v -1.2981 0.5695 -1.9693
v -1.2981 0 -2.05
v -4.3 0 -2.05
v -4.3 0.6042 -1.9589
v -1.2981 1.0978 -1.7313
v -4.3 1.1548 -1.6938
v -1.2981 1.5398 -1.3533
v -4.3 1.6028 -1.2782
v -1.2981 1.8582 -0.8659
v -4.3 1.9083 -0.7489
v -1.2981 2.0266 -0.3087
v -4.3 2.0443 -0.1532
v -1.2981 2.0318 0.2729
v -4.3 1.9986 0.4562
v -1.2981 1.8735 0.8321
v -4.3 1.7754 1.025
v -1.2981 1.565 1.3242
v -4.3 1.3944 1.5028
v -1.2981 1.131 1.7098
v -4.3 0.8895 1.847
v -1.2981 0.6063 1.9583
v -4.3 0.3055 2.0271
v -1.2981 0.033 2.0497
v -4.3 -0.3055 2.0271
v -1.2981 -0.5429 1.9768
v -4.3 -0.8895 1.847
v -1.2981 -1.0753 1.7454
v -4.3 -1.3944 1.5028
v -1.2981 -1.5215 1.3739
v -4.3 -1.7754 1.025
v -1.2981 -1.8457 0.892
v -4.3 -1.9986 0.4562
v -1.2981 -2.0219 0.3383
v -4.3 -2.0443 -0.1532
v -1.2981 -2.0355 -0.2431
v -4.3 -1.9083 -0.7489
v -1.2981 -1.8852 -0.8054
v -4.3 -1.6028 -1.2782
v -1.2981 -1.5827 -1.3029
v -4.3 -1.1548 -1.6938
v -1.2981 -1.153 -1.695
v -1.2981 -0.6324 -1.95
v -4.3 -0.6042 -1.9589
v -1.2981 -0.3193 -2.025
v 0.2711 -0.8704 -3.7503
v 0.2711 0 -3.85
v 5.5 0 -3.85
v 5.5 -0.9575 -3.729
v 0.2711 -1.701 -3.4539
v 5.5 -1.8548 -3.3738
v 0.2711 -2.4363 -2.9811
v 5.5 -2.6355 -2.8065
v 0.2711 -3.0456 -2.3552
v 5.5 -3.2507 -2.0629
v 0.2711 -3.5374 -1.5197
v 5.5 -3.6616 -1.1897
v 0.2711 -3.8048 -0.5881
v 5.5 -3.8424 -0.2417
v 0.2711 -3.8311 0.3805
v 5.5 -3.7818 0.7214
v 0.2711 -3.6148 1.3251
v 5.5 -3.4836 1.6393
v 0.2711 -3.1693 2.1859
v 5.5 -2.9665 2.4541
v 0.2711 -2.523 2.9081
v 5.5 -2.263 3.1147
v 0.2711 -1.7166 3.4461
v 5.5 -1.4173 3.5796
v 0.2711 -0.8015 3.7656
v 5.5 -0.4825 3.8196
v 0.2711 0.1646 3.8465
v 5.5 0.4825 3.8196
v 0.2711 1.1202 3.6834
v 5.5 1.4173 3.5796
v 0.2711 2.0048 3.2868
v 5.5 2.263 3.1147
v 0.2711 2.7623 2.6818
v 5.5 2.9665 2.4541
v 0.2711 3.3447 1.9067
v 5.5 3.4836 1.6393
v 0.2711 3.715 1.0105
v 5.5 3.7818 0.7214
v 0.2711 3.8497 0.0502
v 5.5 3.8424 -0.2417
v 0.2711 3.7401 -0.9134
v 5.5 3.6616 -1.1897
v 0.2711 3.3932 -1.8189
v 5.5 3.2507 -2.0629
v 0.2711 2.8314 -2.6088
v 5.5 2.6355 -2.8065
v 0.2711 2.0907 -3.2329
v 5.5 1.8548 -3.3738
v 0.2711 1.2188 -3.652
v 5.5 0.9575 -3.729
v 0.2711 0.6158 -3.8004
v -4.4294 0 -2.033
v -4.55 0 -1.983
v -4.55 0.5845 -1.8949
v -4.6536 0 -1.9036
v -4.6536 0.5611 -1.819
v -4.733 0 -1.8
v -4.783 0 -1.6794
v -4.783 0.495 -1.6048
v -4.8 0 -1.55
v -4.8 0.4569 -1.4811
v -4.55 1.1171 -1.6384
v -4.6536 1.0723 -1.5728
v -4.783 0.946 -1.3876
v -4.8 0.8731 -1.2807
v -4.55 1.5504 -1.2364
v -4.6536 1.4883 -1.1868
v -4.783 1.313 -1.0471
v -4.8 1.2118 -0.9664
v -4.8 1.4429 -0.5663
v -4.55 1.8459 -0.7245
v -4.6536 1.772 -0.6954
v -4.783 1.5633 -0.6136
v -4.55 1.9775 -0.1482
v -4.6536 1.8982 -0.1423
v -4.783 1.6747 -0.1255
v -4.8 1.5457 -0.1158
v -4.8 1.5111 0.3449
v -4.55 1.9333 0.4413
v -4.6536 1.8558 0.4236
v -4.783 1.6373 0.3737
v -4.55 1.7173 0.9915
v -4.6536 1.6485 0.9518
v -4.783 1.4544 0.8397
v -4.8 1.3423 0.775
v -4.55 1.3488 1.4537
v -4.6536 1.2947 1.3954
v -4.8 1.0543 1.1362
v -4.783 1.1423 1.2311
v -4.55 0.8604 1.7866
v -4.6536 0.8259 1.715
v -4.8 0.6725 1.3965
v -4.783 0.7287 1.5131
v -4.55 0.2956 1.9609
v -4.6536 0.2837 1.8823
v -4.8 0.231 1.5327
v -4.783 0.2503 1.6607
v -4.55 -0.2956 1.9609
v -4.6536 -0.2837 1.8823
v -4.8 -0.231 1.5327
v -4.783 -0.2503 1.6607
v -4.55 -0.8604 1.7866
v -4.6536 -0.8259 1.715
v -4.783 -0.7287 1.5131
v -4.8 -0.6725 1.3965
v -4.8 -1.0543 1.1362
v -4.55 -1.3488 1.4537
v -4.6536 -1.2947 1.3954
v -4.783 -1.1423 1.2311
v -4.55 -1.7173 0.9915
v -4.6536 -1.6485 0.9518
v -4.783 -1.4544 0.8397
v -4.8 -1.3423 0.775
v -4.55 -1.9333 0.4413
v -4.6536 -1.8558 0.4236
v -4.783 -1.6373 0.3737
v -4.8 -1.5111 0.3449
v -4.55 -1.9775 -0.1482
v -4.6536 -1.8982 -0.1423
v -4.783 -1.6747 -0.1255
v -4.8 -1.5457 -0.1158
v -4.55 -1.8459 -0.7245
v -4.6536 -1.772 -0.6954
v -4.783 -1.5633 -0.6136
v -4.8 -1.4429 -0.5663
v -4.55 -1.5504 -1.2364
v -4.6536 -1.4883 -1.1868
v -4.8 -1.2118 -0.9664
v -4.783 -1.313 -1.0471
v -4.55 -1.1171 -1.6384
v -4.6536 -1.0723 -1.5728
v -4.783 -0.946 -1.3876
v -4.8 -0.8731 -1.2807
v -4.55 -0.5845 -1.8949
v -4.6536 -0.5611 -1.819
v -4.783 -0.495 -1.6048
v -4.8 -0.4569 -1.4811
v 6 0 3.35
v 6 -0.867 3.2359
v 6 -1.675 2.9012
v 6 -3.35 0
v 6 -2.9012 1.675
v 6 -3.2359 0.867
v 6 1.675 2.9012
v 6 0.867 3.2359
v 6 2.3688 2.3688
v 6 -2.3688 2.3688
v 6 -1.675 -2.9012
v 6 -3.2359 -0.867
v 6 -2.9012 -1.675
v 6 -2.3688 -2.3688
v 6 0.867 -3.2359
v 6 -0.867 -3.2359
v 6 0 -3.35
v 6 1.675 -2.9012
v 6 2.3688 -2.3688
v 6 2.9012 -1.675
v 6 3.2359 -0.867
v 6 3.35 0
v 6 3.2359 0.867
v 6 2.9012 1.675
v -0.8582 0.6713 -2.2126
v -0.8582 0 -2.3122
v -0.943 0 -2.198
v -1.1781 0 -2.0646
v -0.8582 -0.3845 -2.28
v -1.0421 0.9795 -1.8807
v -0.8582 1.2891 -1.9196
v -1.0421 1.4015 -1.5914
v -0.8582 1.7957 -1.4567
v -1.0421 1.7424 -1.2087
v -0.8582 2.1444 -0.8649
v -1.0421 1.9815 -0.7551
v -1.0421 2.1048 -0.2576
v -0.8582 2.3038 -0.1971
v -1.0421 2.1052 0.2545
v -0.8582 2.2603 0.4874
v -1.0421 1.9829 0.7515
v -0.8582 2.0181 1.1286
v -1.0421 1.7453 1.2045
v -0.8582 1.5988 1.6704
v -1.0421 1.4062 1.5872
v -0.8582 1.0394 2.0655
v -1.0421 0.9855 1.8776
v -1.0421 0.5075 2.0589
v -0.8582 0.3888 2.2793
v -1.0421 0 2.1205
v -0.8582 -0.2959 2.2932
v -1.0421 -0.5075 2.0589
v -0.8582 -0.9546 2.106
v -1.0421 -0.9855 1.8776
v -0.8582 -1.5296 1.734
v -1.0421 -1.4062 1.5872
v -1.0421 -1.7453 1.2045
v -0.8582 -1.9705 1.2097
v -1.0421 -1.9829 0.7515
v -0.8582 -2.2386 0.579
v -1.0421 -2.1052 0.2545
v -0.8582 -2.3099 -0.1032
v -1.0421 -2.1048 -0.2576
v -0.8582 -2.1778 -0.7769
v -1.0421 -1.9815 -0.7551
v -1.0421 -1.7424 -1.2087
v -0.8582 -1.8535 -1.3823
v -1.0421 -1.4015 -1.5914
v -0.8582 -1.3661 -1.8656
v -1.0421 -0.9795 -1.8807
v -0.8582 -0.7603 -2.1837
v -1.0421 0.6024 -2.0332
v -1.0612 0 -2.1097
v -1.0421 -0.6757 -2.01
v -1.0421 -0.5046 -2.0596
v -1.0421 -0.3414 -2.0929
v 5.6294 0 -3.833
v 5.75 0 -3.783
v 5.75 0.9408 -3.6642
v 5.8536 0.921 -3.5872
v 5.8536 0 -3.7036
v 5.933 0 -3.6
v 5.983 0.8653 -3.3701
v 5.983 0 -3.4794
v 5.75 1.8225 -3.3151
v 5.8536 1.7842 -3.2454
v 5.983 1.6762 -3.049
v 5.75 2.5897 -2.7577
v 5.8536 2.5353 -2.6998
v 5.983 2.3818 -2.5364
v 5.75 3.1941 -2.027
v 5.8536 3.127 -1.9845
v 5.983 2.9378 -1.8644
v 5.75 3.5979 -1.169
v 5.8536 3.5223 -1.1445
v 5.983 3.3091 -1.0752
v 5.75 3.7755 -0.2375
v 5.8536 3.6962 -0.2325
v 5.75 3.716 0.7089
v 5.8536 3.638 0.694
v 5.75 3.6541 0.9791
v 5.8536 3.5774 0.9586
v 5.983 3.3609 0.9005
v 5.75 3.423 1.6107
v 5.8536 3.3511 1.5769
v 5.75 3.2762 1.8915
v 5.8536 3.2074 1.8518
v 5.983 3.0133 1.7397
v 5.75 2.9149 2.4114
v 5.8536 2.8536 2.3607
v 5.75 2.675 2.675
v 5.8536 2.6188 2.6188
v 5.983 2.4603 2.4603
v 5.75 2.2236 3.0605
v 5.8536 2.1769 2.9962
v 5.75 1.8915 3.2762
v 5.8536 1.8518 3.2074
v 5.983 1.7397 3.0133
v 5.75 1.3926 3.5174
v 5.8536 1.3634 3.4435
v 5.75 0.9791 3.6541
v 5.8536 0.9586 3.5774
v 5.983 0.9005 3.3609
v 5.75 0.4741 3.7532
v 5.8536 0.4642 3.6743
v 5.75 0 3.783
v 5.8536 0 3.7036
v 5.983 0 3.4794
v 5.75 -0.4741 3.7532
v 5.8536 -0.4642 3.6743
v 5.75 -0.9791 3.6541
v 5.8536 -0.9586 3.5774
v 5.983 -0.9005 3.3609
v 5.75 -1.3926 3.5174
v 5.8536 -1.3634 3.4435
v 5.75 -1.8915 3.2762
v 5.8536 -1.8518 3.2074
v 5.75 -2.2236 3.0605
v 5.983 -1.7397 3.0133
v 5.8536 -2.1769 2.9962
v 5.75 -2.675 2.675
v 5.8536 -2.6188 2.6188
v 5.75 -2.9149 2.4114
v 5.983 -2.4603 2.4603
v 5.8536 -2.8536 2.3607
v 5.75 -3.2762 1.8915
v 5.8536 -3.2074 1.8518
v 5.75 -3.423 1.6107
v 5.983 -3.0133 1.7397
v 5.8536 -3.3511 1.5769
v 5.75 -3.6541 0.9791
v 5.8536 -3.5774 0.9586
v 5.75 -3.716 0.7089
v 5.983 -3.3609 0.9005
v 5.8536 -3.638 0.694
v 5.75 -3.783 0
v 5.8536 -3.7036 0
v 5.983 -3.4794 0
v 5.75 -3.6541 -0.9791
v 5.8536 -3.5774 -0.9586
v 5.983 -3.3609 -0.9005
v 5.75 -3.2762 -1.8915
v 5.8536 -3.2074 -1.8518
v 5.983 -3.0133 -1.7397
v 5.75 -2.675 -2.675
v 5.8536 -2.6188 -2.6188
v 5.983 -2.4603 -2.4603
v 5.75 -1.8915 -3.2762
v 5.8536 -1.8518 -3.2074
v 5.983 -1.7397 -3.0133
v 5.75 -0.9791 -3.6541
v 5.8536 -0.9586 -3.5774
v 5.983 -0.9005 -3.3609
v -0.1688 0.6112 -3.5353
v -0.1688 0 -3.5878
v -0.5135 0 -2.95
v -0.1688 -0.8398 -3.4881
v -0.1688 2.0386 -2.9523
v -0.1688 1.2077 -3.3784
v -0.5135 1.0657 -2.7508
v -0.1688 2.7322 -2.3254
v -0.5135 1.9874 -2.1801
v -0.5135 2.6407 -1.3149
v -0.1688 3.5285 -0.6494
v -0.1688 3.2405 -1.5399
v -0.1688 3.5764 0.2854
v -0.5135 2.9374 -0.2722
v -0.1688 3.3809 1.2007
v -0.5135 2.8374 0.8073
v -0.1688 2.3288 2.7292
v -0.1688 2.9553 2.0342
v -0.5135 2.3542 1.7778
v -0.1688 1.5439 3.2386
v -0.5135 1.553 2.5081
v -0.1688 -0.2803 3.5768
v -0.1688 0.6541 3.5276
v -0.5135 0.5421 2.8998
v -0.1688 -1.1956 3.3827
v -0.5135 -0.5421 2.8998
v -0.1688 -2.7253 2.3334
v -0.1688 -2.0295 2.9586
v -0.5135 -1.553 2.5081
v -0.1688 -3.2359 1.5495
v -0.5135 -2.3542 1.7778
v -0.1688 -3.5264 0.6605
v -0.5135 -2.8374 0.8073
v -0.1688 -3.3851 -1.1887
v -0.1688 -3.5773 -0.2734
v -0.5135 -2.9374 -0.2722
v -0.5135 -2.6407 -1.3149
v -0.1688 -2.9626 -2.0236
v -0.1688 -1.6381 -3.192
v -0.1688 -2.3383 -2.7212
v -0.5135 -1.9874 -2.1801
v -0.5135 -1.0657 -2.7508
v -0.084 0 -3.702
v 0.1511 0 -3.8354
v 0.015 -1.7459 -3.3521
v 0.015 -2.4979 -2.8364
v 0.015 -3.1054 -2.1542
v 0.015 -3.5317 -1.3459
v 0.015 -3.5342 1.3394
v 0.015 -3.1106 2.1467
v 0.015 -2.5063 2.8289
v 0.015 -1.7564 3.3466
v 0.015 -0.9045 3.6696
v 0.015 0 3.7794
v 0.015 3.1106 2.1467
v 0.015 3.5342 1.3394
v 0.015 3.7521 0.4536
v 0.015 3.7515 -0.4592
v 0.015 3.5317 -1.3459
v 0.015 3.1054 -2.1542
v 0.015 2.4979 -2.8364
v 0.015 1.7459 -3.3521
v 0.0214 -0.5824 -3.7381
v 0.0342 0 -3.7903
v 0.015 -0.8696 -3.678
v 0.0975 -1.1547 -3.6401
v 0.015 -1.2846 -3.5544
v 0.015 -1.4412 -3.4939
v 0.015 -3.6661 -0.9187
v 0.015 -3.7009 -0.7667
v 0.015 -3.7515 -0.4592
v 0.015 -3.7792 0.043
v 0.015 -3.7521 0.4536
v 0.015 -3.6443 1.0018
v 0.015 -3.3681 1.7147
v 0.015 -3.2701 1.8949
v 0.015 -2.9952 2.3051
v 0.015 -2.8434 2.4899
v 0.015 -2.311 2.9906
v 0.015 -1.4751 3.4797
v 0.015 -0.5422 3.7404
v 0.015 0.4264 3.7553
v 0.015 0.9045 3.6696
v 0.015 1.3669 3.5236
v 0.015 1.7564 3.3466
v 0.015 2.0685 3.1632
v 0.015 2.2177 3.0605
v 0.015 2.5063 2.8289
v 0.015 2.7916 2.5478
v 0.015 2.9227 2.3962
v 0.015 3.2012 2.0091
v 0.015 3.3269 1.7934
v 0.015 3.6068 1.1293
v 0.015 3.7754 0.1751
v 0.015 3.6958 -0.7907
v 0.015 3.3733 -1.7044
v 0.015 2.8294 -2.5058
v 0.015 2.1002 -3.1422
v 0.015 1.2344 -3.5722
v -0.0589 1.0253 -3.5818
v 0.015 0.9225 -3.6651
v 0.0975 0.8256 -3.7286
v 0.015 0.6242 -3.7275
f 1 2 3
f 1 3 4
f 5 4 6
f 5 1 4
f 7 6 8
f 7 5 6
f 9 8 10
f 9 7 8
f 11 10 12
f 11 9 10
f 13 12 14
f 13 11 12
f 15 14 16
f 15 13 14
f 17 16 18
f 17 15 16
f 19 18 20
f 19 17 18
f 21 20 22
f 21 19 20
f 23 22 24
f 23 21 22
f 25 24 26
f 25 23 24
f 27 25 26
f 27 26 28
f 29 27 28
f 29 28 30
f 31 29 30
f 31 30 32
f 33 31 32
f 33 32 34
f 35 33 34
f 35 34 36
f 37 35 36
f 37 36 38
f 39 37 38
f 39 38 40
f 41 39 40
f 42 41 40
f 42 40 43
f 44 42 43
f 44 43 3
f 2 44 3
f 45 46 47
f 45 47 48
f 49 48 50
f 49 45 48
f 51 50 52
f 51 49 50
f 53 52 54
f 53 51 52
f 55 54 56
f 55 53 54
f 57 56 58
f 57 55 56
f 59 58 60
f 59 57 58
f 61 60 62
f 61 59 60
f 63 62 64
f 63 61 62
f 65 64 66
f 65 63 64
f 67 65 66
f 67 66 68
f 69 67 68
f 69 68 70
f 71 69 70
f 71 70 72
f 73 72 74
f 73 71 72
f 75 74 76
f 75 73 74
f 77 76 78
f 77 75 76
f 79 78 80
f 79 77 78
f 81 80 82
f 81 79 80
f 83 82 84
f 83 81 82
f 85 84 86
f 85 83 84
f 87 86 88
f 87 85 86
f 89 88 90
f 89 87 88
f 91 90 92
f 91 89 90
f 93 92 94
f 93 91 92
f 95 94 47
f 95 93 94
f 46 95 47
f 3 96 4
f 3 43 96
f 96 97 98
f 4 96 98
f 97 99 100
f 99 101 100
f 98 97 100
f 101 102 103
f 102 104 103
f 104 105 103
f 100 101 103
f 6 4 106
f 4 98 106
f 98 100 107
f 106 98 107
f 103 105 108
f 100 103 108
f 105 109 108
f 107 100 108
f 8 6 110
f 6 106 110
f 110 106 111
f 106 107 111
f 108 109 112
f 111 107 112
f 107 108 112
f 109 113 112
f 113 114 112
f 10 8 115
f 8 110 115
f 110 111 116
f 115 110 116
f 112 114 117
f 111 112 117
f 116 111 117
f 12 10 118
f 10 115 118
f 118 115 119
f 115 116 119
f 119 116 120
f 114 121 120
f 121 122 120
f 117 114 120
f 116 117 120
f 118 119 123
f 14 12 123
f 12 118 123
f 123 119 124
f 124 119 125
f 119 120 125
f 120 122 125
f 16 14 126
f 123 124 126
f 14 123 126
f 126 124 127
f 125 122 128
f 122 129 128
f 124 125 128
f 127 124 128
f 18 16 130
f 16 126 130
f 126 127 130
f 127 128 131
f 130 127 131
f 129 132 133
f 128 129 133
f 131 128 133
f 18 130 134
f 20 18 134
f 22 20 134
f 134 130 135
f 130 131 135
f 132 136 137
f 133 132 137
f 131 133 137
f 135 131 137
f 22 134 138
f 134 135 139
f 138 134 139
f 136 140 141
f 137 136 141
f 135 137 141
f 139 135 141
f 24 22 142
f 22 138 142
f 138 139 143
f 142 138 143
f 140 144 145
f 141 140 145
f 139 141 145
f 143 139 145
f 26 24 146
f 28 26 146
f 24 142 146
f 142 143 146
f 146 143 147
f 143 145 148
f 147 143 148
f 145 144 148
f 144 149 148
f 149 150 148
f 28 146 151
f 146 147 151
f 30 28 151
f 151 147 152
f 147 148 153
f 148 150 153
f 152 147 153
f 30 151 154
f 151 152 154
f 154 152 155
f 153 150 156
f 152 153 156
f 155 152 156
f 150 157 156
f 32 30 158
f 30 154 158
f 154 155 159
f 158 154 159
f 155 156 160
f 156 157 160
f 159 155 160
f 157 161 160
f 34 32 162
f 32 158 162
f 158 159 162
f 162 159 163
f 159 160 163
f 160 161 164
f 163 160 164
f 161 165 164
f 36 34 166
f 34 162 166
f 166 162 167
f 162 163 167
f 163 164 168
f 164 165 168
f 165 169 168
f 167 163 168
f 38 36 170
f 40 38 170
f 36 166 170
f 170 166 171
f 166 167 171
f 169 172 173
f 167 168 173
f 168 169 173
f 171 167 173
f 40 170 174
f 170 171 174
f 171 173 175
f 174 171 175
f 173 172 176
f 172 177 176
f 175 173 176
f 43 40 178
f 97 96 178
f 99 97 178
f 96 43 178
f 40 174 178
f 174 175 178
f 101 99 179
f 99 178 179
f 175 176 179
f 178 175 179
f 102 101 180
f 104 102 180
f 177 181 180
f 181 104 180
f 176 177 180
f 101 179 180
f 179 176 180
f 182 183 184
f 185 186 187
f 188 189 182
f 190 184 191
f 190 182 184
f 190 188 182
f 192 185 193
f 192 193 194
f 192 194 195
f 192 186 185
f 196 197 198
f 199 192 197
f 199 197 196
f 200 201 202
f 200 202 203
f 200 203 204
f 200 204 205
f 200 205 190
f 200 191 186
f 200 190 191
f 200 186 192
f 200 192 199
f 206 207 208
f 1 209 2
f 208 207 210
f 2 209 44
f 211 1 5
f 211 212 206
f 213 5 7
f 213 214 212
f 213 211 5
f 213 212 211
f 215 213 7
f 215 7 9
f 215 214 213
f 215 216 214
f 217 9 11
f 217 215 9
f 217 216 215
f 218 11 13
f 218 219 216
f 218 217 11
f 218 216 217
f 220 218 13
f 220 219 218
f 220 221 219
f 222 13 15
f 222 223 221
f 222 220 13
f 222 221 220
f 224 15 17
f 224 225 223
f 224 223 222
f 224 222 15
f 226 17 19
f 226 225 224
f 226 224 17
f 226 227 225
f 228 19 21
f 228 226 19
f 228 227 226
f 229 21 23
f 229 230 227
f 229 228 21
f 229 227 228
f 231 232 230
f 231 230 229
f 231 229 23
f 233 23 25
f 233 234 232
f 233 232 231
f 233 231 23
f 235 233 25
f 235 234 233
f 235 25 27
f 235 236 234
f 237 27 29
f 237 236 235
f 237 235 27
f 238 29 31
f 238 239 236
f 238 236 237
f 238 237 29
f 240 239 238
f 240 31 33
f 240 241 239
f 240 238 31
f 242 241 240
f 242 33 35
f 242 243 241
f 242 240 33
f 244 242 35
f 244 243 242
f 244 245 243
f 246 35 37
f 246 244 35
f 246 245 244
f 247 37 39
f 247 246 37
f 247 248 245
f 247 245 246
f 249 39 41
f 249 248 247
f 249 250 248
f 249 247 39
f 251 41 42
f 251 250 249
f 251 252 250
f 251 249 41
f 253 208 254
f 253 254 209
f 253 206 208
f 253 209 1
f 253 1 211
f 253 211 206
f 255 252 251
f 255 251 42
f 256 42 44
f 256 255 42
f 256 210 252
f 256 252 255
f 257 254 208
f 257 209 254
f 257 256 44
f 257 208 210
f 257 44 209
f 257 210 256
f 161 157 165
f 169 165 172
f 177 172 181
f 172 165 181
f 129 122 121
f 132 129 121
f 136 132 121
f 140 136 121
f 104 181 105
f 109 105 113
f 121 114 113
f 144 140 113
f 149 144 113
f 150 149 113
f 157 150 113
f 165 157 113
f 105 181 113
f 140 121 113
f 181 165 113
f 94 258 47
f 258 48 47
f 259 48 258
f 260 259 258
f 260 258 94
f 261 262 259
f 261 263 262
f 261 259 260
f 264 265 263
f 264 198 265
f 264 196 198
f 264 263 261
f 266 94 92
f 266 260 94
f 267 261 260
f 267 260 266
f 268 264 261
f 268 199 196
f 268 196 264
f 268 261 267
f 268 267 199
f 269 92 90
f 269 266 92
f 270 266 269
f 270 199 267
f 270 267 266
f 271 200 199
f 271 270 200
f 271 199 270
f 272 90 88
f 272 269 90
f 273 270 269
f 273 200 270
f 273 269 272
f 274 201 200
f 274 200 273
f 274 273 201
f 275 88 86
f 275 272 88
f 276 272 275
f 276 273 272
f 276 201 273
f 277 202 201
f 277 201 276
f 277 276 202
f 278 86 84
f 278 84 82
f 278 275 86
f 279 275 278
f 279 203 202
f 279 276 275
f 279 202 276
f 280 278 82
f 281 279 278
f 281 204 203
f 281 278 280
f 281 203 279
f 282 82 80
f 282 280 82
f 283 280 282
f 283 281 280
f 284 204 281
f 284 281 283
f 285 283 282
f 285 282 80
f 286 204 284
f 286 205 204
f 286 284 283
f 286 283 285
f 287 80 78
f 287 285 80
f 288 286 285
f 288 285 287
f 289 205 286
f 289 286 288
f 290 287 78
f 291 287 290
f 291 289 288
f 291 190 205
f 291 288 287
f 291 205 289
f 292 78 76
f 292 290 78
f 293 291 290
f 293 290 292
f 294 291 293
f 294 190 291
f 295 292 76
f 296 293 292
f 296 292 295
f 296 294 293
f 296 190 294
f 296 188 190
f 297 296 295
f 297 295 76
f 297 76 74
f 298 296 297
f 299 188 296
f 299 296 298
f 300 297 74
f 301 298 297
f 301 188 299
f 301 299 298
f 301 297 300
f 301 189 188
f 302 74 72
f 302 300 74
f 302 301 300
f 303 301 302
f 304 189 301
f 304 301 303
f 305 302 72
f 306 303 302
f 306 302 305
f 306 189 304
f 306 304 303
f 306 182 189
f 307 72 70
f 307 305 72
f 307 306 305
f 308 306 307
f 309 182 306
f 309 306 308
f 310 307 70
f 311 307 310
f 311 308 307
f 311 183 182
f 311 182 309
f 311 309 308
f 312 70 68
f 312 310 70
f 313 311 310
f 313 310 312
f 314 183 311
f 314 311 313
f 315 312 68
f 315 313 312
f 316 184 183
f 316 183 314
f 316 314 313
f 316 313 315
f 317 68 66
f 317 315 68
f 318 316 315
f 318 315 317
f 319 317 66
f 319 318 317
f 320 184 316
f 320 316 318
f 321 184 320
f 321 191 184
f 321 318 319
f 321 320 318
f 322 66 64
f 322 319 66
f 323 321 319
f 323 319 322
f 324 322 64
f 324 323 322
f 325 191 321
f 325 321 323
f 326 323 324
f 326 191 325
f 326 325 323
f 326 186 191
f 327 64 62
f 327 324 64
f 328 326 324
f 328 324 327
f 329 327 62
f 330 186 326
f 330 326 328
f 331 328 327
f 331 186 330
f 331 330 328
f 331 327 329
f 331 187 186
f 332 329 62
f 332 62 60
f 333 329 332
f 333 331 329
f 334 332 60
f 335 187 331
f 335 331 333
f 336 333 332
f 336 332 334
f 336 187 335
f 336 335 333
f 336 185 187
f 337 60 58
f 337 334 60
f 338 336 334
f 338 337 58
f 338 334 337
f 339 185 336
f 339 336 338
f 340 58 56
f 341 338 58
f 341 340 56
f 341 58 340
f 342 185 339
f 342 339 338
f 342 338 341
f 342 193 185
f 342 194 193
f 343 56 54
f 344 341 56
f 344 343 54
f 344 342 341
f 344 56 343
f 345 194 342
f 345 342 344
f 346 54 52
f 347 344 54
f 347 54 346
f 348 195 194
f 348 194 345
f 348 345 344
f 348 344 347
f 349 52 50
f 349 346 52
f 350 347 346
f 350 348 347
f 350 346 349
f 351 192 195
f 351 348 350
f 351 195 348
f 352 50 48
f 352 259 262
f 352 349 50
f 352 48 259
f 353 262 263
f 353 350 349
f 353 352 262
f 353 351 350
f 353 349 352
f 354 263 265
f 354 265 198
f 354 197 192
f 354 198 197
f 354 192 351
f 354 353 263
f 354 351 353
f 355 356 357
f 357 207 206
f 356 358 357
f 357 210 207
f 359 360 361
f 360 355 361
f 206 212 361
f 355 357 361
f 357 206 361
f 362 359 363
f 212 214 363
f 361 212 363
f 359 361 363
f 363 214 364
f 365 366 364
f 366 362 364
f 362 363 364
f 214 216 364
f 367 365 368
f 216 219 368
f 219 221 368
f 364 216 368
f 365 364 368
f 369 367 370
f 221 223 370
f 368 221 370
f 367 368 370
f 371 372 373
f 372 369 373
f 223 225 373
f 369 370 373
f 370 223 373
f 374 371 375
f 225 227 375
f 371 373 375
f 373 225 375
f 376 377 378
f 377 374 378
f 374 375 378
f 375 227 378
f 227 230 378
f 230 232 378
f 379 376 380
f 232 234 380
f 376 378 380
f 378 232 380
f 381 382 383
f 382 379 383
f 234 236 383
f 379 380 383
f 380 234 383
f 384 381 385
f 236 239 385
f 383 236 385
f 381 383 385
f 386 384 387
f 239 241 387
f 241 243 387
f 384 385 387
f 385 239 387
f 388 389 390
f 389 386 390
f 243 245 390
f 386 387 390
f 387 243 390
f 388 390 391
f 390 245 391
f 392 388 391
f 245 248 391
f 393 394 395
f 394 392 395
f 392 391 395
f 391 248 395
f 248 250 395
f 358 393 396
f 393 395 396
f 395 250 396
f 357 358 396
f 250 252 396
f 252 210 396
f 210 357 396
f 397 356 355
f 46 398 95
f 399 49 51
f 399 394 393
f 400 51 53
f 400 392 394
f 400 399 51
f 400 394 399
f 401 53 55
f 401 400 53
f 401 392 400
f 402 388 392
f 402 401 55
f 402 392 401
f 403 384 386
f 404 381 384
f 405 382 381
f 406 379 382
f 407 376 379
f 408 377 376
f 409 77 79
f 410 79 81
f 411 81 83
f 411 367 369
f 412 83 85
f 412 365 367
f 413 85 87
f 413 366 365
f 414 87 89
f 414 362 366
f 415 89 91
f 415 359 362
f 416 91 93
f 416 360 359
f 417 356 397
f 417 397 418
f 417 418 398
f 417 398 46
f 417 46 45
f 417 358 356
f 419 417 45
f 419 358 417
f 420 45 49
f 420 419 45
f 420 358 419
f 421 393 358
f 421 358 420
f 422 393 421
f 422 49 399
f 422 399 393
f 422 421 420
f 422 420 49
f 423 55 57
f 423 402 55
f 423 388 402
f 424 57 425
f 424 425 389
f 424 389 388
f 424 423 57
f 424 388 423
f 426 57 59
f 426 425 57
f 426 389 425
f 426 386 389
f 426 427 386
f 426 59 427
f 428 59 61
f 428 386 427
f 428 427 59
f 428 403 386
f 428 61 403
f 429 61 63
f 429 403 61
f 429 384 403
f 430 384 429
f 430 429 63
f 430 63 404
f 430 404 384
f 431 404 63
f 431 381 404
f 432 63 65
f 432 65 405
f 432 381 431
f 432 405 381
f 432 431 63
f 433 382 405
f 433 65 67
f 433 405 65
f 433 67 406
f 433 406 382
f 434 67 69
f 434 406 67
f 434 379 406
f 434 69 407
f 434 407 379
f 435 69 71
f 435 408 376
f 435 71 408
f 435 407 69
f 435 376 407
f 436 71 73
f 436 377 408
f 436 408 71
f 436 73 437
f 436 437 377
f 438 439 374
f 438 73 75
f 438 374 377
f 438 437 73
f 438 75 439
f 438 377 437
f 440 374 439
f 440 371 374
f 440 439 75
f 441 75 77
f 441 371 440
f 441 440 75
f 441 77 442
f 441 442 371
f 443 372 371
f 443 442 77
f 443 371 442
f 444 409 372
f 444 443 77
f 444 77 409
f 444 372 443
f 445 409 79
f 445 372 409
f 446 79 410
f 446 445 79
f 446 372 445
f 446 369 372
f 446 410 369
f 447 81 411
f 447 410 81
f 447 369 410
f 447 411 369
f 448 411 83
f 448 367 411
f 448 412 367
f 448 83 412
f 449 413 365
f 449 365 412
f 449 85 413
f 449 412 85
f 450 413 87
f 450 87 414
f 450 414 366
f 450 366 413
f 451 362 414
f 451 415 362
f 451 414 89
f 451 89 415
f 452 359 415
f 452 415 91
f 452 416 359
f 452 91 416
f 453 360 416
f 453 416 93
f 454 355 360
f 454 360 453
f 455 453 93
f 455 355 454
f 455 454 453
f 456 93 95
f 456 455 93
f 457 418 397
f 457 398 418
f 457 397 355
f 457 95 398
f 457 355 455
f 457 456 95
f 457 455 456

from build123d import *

# Parameters (mm, degrees)
CROQUIS1_R              = 3.85
CROQUIS1_R_2            = 2.05
SALIENTE_EXTRUIR1_DEPTH = 6
CROQUIS1_3_R            = 2.05
SALIENTE_EXTRUIR2_DEPTH = 4.8
CHAFL_N1_SIZE           = 1.85
CHAFL_N1_SIZE_2         = 1
REDONDEO1_R             = 0.5


with BuildPart() as part:
    # Croquis1 → Saliente-Extruir1 (new body)
    # profile 1 of 2: a face of its own
    with BuildSketch(Plane.YZ):
        with Locations(Location((0, 0, 0), (0, 0, 270))):
            Circle(CROQUIS1_R)
        Circle(CROQUIS1_R_2, mode=Mode.SUBTRACT)
    # profile 2 of 2: a face of its own
    with BuildSketch(Plane.YZ):
        Circle(CROQUIS1_R_2)
    extrude(amount=SALIENTE_EXTRUIR1_DEPTH)

    # Croquis1<3> → Saliente-Extruir2 (add)
    with BuildSketch(Plane.YZ):
        with Locations(Location((0, 0, 0), (0, 0, 270))):
            Circle(CROQUIS1_3_R)
    extrude(amount=-SALIENTE_EXTRUIR2_DEPTH)

    # Chaflán1
    # the kernel refuses this chamfer: 1.85, 1 mm, written as the material it adds along each edge
    with BuildSketch(Plane(origin=(0, 0, 0), x_dir=(0, 0, -1), z_dir=(0, -1, 0))) as chafl_n1_piece_1_section:
        Polygon((2.05 + CHAFL_N1_SIZE, 0), (2.05, -CHAFL_N1_SIZE_2), (2.05, 0), align=None)
    chafl_n1_piece_1 = revolve(axis=Axis((0, 0, 0), (1, 0, 0)), mode=Mode.PRIVATE)
    chafl_n1_piece_1 = chafl_n1_piece_1 & Plane(origin=(-0.508255833, 0, 0), x_dir=(0, 0, -1), z_dir=(-1, 0, 0)) * Cylinder(3.85, 16, mode=Mode.PRIVATE)
    add(chafl_n1_piece_1)

    # Redondeo1
    redondeo1_edges = [part.edges().sort_by_distance(p)[0] for p in [
        (-1, 0, 2.05),
        (-0.027027027, 0, 3.85),
        (6, 0, 3.85),
        (-4.8, 0, 2.05),
    ]]
    fillet(redondeo1_edges, radius=REDONDEO1_R)


solid = part.part
